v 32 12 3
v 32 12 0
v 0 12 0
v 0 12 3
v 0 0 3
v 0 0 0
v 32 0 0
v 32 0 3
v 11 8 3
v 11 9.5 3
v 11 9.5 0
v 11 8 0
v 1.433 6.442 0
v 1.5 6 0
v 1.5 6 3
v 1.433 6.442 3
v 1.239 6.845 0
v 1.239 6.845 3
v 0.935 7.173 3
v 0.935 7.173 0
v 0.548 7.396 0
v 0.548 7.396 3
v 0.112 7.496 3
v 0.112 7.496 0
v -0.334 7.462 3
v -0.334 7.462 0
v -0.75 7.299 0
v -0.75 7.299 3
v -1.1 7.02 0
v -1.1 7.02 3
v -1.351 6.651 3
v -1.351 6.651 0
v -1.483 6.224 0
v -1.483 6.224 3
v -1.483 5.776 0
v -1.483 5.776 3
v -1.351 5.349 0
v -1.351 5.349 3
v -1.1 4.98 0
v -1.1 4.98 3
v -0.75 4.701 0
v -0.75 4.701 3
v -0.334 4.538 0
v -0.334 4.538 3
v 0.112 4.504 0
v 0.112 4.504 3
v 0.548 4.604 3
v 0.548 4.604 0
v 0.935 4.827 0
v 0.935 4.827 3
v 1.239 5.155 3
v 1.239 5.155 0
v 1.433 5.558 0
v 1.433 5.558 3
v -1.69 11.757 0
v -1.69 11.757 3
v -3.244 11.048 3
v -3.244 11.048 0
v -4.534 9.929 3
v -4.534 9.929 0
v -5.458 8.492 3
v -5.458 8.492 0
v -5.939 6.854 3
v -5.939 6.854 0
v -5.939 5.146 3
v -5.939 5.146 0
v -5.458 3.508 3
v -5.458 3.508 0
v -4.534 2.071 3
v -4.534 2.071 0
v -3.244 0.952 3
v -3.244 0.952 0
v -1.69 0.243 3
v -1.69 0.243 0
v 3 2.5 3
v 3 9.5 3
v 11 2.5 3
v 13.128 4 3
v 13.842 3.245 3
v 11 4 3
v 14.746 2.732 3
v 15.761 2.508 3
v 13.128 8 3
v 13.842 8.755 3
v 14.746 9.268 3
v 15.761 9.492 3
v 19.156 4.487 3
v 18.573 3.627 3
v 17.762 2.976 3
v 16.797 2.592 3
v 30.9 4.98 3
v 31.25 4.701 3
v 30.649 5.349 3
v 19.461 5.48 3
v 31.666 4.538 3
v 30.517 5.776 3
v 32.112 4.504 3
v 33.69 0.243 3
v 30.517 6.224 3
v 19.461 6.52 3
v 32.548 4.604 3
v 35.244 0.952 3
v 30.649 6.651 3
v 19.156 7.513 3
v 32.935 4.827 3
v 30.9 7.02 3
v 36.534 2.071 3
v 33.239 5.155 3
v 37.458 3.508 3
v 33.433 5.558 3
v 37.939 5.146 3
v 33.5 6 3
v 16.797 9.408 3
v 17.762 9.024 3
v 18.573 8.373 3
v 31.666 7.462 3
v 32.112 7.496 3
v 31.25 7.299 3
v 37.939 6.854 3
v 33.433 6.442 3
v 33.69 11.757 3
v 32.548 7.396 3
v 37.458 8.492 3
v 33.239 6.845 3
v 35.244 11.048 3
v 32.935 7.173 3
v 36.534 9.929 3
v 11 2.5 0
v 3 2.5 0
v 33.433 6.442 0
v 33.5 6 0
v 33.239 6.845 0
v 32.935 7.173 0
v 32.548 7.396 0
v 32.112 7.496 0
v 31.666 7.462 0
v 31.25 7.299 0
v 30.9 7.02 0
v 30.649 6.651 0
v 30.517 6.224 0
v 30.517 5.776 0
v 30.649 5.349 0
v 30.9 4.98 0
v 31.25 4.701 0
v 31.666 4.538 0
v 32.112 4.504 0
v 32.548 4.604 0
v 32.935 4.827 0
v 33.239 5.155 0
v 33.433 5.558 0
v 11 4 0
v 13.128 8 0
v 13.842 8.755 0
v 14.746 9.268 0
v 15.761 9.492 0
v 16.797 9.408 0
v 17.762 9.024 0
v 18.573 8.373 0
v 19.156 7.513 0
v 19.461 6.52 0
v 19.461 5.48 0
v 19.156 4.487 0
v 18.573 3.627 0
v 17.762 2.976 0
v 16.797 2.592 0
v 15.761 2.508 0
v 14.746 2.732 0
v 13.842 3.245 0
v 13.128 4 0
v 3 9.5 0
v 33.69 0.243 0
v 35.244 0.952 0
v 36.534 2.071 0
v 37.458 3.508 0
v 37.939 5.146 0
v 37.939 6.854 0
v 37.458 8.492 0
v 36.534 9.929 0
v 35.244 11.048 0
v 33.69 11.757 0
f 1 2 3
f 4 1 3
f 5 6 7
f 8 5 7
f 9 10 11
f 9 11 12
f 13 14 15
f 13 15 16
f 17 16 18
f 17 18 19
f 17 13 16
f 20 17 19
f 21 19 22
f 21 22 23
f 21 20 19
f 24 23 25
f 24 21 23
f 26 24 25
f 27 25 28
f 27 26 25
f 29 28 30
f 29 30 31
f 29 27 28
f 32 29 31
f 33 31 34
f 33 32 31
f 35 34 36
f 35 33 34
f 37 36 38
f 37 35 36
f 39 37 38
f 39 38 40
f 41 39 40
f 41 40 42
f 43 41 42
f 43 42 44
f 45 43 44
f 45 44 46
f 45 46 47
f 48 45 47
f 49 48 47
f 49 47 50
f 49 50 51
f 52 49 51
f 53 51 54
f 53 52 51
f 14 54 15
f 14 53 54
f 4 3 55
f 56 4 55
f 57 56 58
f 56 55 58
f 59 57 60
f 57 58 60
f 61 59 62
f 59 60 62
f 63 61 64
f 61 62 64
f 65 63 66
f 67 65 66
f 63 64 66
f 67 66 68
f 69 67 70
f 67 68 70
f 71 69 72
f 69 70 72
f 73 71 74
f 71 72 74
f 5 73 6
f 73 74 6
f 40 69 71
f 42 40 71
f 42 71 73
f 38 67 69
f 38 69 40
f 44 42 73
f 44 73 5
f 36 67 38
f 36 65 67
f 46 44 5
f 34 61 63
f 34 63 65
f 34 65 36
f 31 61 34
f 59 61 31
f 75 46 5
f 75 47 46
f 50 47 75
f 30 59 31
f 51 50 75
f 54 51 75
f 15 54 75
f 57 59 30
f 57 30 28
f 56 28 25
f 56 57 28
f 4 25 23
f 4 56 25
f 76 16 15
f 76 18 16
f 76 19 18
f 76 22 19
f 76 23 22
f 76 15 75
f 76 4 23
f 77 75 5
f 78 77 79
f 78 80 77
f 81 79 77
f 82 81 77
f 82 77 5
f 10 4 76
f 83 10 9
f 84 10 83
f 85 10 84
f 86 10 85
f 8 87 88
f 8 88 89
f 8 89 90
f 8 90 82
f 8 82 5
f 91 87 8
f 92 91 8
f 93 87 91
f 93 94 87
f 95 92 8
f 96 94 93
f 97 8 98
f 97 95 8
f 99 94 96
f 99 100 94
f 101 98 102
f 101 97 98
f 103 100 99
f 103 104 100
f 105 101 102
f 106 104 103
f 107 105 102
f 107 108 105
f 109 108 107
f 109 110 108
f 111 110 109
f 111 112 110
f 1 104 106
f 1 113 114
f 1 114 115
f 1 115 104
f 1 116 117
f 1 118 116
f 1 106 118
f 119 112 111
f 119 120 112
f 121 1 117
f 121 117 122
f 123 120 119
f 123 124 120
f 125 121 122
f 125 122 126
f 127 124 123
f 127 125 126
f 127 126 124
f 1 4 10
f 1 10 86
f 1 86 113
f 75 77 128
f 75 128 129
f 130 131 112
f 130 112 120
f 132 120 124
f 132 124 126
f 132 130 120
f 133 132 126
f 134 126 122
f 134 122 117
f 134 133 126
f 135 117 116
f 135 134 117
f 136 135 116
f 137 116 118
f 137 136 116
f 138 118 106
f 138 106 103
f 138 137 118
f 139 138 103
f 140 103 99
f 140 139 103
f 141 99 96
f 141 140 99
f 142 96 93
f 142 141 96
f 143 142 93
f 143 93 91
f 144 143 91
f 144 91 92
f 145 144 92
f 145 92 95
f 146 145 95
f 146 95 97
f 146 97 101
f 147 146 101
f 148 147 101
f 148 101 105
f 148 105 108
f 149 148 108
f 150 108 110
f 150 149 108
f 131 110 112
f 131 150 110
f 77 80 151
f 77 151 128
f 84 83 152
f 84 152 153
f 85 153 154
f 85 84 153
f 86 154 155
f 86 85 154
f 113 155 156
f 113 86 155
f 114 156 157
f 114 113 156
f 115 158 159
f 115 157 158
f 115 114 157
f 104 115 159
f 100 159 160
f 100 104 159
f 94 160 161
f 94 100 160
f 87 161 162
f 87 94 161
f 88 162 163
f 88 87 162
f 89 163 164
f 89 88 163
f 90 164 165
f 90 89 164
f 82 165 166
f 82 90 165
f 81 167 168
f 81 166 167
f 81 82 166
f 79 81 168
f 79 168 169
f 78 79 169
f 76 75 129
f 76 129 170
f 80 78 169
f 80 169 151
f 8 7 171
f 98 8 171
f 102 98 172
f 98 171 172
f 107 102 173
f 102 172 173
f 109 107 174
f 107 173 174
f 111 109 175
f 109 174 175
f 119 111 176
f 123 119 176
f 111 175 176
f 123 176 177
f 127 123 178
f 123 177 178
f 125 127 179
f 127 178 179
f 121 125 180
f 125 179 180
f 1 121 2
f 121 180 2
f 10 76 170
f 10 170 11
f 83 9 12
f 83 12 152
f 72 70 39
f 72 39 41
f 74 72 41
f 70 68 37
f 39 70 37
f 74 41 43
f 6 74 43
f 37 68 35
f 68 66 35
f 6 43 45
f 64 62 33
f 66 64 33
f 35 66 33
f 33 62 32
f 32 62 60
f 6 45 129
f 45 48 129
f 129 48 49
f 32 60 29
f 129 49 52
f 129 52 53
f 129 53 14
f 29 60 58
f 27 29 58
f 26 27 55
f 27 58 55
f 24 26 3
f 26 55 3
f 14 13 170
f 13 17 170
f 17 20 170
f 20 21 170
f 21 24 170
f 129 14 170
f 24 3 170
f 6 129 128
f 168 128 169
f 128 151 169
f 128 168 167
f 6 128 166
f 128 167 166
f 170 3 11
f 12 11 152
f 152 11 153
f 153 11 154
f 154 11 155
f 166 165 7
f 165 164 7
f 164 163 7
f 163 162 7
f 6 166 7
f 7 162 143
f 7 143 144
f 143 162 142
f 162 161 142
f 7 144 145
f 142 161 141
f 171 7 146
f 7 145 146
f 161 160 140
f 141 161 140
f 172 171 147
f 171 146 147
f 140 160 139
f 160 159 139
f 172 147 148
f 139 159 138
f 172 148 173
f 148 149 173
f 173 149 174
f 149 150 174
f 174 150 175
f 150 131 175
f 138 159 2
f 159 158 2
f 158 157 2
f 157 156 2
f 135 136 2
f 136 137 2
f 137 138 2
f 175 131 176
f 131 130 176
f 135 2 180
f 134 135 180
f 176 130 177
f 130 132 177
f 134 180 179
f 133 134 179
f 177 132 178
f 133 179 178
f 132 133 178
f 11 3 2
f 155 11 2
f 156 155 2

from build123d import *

# Parameters (mm, degrees)
SKETCH1_R           = 1.5
BOSS_EXTRUDE1_DEPTH = 3
CUT_EXTRUDE1_DEPTH  = 40.962482405


with BuildPart() as part:
    # Sketch1 → Boss-Extrude1 (new body)
    with BuildSketch(Plane.XY):
        with BuildLine():
            Line((0, 0), (32, 0))
            ThreePointArc((32, 0), (38, 6), (32, 12))
            Line((32, 12), (0, 12))
            ThreePointArc((0, 12), (-6, 6), (0, 0))
        make_face()
        with Locations((0, 6)):
            Circle(SKETCH1_R, mode=Mode.SUBTRACT)
        with Locations((32, 6)):
            Circle(SKETCH1_R, mode=Mode.SUBTRACT)
    extrude(amount=BOSS_EXTRUDE1_DEPTH)

    # Sketch2 → Cut-Extrude1 (cut, through all)
    with BuildSketch(Plane.XY.offset(3)):
        with BuildLine():
            Line((3, 9.5), (11, 9.5))
            Line((11, 9.5), (11, 8))
            Line((11, 8), (13.127718677, 8))
            ThreePointArc((13.127718677, 8), (19.5, 6), (13.127718677, 4))
            Line((13.127718677, 4), (11, 4))
            Line((11, 4), (11, 2.5))
            Line((11, 2.5), (3, 2.5))
            Line((3, 2.5), (3, 9.5))
        make_face()
    extrude(amount=-CUT_EXTRUDE1_DEPTH, mode=Mode.SUBTRACT)


solid = part.part
